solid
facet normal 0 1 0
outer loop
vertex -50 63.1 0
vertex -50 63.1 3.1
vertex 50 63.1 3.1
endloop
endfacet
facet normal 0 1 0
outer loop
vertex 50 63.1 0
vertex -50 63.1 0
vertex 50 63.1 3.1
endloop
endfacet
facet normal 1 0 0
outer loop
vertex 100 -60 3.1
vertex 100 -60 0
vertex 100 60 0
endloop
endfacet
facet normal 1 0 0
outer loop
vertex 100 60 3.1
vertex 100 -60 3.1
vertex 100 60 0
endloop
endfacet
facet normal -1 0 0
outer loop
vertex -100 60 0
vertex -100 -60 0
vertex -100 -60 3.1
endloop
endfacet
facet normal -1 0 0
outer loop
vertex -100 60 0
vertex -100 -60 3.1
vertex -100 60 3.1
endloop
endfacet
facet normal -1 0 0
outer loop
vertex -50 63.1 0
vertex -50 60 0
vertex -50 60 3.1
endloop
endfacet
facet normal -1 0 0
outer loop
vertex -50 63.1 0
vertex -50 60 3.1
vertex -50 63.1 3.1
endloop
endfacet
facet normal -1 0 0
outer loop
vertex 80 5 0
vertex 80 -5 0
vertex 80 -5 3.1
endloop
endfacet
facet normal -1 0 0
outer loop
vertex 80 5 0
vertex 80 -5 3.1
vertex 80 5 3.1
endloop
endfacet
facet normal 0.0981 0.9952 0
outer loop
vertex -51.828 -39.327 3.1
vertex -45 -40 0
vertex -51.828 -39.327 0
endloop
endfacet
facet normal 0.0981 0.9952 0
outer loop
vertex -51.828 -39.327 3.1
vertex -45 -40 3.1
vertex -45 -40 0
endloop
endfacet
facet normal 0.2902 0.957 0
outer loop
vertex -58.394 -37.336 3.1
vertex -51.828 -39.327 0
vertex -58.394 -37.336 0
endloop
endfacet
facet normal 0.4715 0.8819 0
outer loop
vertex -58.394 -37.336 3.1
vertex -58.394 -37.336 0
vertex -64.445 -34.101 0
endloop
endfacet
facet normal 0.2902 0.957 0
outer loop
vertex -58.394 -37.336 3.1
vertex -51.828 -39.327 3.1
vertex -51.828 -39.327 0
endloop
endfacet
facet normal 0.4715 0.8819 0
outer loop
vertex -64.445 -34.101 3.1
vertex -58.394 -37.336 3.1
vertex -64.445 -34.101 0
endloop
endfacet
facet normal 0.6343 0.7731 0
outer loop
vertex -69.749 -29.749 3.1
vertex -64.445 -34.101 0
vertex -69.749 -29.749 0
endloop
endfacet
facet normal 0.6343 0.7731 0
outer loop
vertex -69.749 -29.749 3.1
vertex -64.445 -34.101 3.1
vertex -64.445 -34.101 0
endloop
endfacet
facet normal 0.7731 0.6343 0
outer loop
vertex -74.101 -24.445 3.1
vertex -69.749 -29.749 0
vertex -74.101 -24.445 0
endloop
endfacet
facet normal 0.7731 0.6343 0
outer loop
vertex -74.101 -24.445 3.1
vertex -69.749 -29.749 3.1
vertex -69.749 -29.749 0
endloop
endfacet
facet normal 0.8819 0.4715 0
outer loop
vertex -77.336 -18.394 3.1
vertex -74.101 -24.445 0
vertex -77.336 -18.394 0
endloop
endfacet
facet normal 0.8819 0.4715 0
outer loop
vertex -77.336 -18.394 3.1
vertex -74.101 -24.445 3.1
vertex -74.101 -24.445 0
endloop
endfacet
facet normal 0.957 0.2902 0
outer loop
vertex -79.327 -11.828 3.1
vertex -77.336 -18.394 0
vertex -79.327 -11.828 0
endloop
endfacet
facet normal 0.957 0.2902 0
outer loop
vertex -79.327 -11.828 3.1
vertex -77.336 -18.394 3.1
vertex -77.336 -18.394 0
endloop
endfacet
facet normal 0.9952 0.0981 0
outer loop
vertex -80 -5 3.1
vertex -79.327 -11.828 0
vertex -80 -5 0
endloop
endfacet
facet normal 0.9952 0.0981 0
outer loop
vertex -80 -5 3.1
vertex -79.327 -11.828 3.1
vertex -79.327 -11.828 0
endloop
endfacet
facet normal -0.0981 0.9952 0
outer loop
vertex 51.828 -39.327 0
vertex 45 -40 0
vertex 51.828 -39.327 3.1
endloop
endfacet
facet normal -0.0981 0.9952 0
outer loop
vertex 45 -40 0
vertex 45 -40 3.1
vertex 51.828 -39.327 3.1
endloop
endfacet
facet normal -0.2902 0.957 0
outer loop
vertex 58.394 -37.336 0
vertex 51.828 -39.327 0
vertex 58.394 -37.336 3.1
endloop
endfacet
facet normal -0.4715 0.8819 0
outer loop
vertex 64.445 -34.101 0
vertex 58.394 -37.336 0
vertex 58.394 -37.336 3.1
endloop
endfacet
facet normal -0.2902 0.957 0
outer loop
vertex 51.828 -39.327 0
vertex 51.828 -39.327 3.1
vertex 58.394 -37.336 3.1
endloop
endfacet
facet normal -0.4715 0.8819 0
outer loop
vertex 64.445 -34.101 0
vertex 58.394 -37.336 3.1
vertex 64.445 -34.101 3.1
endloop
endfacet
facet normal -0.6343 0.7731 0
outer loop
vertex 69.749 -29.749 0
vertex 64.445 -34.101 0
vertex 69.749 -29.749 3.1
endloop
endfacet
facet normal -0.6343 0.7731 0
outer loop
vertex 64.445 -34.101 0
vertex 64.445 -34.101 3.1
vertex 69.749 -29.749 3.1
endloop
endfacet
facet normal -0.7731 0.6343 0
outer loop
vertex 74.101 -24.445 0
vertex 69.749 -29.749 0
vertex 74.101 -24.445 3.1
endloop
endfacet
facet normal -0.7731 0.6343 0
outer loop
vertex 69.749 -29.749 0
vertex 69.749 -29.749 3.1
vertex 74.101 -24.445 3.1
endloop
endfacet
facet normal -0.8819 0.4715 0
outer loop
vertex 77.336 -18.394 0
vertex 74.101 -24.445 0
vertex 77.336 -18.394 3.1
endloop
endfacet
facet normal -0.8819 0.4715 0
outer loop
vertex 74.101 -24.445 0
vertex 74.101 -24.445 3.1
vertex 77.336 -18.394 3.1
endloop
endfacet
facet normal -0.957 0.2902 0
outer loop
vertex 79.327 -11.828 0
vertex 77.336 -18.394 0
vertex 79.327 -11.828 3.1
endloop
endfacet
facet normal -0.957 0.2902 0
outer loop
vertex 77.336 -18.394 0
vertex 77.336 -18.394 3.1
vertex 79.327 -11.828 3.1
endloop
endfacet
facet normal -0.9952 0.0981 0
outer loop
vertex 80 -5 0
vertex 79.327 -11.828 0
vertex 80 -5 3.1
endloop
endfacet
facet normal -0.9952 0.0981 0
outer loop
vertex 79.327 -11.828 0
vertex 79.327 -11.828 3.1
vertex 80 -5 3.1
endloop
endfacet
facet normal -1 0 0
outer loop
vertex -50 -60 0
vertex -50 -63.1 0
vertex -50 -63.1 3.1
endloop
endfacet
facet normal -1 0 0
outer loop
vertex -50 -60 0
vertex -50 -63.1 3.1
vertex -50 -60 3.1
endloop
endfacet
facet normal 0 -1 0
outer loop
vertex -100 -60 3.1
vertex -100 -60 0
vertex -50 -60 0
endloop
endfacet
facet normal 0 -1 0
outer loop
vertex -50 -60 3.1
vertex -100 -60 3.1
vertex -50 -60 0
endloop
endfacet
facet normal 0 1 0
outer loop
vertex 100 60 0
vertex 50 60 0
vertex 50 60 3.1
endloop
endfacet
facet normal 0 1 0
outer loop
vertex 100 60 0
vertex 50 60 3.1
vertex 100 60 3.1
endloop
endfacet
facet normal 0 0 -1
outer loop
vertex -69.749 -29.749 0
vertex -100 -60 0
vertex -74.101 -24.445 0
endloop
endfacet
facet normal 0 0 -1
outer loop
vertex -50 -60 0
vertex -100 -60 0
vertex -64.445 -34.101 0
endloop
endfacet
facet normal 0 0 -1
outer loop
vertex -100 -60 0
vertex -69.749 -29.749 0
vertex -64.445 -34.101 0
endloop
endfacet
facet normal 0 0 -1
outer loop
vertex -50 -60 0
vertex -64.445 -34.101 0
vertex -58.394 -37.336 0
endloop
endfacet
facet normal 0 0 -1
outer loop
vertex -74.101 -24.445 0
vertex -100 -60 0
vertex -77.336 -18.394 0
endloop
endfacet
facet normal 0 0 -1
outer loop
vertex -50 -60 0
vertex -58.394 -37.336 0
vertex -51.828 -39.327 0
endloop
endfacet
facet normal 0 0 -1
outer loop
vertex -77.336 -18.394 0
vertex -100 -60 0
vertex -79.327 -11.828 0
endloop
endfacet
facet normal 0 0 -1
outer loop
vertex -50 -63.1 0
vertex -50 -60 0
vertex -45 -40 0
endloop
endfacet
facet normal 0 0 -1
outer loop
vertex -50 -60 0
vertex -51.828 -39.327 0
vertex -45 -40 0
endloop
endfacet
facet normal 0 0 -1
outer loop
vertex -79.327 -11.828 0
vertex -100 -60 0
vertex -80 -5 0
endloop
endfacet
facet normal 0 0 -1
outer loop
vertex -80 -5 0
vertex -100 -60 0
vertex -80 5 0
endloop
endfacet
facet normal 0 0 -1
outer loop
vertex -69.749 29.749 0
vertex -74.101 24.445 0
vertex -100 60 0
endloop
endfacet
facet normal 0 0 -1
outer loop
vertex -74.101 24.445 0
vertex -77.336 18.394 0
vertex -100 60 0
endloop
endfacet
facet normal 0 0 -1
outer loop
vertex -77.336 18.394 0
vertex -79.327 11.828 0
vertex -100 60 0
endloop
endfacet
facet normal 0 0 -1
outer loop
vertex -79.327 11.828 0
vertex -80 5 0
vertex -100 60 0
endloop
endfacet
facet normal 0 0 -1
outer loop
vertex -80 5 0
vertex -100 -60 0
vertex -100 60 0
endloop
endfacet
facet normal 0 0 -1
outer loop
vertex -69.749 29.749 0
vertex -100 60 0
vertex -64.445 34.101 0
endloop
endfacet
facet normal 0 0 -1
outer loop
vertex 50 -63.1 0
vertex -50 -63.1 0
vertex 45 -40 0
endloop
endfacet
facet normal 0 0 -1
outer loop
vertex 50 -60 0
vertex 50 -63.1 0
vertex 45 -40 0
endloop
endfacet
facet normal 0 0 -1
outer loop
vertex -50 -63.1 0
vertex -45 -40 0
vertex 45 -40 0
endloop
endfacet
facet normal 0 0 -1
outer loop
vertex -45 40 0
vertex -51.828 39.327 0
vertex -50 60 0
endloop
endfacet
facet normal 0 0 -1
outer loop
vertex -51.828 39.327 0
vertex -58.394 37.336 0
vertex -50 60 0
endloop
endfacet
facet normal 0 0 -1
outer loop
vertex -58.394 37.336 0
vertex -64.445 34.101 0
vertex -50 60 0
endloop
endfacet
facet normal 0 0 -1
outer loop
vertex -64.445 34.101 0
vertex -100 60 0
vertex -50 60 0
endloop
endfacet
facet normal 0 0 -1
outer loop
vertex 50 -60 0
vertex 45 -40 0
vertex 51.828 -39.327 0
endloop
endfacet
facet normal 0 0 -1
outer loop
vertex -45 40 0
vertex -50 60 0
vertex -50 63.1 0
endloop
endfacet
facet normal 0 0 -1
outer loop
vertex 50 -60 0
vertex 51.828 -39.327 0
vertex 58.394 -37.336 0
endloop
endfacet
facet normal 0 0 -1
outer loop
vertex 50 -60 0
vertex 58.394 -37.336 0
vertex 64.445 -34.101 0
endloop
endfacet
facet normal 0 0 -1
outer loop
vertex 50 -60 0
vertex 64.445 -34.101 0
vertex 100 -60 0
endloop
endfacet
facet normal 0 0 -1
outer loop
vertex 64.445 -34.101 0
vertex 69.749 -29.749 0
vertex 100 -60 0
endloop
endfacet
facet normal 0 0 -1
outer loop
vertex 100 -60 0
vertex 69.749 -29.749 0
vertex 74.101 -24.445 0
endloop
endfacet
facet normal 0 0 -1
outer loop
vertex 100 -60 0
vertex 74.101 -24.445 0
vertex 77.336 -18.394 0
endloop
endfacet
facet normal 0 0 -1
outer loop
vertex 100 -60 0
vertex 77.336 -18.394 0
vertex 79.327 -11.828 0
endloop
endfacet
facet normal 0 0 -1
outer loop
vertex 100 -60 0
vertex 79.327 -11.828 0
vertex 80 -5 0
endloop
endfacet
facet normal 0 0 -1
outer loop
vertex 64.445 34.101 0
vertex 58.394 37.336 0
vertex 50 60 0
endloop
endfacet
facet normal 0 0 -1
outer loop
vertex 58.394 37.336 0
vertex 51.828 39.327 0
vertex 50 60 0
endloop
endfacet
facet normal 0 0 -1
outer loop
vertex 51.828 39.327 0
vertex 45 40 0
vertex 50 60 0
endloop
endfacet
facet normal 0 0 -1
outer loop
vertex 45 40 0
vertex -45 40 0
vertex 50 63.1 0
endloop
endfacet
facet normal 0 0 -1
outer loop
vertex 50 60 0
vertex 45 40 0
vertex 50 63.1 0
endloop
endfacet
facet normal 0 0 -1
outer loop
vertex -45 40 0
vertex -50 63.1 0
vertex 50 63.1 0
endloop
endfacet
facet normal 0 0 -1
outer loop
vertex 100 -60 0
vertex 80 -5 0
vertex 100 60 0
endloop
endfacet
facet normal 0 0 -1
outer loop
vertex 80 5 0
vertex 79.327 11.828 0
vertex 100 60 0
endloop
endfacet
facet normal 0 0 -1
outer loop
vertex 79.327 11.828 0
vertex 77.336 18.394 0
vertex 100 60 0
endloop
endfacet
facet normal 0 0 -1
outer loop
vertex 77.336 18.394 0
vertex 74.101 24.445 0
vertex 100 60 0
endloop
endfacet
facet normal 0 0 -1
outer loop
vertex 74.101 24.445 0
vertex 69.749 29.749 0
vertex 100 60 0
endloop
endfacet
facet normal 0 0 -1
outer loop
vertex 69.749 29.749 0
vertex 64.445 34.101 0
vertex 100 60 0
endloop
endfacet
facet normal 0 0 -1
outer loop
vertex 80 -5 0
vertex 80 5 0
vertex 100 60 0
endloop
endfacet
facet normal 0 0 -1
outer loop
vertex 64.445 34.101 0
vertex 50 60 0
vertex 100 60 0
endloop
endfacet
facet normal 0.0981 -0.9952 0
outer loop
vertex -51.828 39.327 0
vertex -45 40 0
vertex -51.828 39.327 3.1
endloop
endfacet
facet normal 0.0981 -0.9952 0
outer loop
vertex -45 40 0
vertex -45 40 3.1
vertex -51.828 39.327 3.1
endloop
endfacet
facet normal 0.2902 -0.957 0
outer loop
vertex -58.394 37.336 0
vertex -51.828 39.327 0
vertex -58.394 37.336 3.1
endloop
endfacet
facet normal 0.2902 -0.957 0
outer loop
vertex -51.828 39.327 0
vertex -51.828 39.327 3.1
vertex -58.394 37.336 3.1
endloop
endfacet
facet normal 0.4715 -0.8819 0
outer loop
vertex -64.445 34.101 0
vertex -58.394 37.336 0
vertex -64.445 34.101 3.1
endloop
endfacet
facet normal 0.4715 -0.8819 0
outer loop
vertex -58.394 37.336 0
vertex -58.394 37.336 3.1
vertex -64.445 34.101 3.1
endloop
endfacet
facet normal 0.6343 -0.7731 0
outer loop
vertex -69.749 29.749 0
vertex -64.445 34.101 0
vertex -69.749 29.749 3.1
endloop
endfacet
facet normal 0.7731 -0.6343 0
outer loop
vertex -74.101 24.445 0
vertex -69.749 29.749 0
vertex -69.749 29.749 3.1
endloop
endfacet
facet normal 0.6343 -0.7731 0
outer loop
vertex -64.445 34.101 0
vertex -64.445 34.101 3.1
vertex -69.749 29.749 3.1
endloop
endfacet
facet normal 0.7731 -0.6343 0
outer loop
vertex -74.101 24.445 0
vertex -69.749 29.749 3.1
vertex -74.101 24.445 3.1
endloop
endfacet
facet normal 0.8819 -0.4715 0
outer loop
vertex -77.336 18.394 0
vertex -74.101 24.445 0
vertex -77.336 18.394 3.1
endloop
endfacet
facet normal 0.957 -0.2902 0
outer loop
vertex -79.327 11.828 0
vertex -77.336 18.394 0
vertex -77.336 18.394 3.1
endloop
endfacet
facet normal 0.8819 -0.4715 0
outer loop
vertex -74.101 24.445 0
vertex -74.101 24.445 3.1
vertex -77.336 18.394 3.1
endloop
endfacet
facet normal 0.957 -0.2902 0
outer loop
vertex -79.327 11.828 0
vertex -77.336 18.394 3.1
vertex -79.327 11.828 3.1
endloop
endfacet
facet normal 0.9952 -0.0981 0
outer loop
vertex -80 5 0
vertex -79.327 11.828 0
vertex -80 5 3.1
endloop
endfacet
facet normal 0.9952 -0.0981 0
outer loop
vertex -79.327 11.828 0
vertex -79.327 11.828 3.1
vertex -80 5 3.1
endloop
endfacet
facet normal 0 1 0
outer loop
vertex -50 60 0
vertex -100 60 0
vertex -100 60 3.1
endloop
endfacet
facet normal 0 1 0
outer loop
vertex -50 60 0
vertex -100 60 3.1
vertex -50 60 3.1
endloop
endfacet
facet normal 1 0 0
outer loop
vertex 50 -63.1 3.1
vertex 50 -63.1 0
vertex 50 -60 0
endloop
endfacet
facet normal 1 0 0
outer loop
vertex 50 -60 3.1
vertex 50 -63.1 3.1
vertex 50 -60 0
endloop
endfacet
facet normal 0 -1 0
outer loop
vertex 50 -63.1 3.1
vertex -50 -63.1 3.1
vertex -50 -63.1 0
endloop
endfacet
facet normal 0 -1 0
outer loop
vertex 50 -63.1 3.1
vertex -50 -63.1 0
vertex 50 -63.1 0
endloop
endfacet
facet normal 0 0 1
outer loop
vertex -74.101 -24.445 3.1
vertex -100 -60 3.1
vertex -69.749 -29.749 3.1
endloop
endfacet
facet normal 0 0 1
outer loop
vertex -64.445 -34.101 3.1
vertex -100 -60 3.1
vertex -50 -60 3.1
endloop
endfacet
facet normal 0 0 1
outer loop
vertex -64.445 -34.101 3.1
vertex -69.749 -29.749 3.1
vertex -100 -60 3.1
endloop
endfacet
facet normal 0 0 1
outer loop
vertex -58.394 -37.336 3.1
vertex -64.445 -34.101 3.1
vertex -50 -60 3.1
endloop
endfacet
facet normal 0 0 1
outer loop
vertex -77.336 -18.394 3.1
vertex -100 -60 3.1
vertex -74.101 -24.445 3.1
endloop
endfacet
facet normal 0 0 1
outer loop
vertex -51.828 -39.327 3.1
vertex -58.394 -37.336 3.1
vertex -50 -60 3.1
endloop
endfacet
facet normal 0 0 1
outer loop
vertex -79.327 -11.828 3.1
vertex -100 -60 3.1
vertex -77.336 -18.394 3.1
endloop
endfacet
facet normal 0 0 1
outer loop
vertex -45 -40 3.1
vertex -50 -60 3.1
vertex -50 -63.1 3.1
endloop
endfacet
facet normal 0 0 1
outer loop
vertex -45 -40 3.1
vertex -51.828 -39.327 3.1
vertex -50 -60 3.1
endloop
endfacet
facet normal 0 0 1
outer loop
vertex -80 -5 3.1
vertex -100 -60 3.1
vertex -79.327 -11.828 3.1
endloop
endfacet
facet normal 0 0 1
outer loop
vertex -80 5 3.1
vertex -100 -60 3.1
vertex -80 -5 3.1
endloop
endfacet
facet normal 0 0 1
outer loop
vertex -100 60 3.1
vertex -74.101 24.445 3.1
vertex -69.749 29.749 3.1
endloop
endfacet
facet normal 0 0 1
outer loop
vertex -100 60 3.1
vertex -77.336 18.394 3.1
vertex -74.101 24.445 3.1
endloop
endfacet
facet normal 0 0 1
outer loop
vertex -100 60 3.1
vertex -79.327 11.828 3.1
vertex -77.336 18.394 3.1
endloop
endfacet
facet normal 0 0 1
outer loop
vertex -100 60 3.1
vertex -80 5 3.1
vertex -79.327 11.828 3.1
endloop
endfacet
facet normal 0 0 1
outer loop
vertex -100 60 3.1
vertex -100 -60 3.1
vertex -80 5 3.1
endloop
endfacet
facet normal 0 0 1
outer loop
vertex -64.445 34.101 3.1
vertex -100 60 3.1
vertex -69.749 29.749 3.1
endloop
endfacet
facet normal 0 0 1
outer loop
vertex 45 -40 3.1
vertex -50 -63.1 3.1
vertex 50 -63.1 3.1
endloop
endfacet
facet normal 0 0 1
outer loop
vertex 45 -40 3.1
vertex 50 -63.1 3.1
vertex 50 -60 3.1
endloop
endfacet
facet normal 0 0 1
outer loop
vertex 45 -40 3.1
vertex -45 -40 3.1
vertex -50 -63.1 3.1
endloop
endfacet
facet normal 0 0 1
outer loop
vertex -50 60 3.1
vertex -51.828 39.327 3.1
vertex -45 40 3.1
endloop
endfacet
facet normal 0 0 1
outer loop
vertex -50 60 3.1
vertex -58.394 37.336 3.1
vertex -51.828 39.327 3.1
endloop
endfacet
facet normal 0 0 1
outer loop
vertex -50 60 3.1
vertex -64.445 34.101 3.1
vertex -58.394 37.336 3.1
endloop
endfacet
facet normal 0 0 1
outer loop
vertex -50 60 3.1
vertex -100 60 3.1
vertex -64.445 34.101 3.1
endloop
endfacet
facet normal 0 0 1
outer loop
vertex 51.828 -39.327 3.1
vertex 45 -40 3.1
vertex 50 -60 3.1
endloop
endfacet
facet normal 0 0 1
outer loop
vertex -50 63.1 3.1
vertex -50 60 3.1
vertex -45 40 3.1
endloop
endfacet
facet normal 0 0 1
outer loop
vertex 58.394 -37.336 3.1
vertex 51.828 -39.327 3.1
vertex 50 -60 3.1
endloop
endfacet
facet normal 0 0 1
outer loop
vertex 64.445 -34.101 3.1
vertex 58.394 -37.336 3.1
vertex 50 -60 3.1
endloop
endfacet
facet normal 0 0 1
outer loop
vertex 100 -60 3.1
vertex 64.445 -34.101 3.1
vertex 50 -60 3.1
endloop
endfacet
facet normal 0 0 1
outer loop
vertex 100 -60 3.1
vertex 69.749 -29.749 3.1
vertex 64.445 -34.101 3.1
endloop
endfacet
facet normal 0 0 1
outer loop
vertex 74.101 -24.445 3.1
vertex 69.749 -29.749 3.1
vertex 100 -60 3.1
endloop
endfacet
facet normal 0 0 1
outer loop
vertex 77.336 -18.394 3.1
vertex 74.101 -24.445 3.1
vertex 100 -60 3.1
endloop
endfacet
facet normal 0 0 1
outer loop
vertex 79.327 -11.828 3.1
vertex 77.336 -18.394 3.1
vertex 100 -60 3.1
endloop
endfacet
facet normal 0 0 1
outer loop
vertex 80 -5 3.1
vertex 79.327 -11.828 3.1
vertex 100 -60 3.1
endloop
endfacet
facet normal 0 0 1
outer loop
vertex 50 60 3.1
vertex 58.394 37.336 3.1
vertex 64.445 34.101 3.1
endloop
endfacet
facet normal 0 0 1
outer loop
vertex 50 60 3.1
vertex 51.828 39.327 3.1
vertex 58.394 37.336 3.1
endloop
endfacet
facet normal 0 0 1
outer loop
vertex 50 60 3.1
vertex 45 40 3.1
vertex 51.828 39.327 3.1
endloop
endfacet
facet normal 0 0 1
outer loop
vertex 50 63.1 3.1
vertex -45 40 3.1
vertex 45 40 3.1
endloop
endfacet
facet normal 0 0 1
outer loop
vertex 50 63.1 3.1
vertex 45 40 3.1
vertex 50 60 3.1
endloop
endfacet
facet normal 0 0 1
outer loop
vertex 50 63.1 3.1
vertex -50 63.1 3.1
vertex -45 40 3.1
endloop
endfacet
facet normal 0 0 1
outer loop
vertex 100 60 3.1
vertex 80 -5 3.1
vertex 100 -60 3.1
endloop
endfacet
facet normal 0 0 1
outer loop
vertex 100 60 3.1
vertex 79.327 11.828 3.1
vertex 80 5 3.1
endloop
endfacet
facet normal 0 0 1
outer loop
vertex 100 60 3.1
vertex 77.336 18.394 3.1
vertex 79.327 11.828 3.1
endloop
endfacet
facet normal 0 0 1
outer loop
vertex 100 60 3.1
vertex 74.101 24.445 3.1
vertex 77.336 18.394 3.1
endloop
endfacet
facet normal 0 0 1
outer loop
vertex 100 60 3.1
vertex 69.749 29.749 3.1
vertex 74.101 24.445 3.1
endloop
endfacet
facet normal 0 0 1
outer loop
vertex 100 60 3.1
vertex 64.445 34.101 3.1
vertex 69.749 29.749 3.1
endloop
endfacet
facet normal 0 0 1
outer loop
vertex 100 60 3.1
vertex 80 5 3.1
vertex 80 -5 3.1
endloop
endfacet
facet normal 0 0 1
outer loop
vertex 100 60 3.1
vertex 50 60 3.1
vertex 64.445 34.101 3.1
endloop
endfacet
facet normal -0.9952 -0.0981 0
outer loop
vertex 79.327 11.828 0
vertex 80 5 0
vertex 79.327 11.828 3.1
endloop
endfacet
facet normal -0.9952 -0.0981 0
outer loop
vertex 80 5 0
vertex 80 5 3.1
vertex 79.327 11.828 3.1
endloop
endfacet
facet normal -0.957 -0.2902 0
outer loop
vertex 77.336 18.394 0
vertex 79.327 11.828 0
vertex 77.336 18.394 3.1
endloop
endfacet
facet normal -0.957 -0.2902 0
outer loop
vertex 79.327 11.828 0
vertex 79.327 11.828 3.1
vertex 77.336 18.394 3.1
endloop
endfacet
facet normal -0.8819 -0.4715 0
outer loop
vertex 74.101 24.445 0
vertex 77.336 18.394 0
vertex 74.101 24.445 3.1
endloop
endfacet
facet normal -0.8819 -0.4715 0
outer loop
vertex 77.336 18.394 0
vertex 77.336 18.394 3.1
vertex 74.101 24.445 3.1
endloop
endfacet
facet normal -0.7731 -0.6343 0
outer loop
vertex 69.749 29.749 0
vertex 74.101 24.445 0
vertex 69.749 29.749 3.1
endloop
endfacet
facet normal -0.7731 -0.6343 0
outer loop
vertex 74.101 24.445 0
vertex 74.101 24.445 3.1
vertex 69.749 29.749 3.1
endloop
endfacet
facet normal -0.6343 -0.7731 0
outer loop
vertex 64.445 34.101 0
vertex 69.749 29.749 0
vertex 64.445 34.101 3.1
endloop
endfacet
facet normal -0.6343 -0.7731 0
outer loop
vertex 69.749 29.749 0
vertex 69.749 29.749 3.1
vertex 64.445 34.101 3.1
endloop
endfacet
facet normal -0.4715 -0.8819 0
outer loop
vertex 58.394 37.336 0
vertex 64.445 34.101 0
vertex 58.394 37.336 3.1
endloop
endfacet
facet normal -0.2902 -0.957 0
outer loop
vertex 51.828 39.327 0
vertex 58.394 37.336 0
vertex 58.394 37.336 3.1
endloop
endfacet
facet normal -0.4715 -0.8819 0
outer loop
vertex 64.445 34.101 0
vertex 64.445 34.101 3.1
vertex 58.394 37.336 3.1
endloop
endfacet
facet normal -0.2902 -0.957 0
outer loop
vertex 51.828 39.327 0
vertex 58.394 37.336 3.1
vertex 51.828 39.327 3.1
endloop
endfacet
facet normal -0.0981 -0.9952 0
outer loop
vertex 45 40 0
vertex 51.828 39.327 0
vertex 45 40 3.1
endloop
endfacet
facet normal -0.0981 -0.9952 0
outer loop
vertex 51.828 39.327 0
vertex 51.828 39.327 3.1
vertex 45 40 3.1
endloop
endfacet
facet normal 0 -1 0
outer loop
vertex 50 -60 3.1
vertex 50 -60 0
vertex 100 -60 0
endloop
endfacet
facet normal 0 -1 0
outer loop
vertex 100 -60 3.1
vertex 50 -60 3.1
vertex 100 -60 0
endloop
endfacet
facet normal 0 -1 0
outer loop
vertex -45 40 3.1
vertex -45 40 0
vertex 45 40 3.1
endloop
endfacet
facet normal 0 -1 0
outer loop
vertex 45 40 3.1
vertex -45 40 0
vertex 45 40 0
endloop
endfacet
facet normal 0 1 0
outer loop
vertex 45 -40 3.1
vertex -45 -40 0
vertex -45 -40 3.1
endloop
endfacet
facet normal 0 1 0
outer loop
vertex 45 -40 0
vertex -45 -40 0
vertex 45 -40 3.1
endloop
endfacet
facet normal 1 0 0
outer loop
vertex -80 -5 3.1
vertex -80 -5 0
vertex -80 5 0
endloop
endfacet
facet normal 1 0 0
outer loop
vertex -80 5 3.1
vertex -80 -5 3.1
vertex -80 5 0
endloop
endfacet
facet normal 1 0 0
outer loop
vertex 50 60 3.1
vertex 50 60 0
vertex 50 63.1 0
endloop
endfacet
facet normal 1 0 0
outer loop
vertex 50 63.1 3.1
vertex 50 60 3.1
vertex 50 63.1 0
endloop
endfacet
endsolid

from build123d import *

# Parameters (mm, degrees)
SKETCH1_W           = 200
SKETCH1_H           = 120
SKETCH1_W_2         = 160
SKETCH1_H_2         = 80
BOSS_EXTRUDE1_DEPTH = 3.1
SKETCH2_W           = 100
SKETCH2_H           = 3.1
BOSS_EXTRUDE2_DEPTH = 3.1
FILLET1_R           = 35


with BuildPart() as part:
    # Sketch1 → Boss-Extrude1 (new body)
    with BuildSketch(Plane.XY):
        Rectangle(SKETCH1_W, SKETCH1_H)
        Rectangle(SKETCH1_W_2, SKETCH1_H_2, mode=Mode.SUBTRACT)
    extrude(amount=BOSS_EXTRUDE1_DEPTH)

    # Sketch2 → Boss-Extrude2 (add)
    with BuildSketch(Plane.XY.offset(3.1)):
        with Locations((0, 61.55)):
            Rectangle(SKETCH2_W, SKETCH2_H)
        with Locations((0, -61.55)):
            Rectangle(SKETCH2_W, SKETCH2_H)
    extrude(amount=-BOSS_EXTRUDE2_DEPTH)

    # Fillet1
    fillet1_edges = [part.edges().sort_by_distance(p)[0] for p in [
        (80, -40, 1.55),
        (80, 40, 1.55),
        (-80, 40, 1.55),
        (-80, -40, 1.55),
    ]]
    fillet(fillet1_edges, radius=FILLET1_R)


solid = part.part
